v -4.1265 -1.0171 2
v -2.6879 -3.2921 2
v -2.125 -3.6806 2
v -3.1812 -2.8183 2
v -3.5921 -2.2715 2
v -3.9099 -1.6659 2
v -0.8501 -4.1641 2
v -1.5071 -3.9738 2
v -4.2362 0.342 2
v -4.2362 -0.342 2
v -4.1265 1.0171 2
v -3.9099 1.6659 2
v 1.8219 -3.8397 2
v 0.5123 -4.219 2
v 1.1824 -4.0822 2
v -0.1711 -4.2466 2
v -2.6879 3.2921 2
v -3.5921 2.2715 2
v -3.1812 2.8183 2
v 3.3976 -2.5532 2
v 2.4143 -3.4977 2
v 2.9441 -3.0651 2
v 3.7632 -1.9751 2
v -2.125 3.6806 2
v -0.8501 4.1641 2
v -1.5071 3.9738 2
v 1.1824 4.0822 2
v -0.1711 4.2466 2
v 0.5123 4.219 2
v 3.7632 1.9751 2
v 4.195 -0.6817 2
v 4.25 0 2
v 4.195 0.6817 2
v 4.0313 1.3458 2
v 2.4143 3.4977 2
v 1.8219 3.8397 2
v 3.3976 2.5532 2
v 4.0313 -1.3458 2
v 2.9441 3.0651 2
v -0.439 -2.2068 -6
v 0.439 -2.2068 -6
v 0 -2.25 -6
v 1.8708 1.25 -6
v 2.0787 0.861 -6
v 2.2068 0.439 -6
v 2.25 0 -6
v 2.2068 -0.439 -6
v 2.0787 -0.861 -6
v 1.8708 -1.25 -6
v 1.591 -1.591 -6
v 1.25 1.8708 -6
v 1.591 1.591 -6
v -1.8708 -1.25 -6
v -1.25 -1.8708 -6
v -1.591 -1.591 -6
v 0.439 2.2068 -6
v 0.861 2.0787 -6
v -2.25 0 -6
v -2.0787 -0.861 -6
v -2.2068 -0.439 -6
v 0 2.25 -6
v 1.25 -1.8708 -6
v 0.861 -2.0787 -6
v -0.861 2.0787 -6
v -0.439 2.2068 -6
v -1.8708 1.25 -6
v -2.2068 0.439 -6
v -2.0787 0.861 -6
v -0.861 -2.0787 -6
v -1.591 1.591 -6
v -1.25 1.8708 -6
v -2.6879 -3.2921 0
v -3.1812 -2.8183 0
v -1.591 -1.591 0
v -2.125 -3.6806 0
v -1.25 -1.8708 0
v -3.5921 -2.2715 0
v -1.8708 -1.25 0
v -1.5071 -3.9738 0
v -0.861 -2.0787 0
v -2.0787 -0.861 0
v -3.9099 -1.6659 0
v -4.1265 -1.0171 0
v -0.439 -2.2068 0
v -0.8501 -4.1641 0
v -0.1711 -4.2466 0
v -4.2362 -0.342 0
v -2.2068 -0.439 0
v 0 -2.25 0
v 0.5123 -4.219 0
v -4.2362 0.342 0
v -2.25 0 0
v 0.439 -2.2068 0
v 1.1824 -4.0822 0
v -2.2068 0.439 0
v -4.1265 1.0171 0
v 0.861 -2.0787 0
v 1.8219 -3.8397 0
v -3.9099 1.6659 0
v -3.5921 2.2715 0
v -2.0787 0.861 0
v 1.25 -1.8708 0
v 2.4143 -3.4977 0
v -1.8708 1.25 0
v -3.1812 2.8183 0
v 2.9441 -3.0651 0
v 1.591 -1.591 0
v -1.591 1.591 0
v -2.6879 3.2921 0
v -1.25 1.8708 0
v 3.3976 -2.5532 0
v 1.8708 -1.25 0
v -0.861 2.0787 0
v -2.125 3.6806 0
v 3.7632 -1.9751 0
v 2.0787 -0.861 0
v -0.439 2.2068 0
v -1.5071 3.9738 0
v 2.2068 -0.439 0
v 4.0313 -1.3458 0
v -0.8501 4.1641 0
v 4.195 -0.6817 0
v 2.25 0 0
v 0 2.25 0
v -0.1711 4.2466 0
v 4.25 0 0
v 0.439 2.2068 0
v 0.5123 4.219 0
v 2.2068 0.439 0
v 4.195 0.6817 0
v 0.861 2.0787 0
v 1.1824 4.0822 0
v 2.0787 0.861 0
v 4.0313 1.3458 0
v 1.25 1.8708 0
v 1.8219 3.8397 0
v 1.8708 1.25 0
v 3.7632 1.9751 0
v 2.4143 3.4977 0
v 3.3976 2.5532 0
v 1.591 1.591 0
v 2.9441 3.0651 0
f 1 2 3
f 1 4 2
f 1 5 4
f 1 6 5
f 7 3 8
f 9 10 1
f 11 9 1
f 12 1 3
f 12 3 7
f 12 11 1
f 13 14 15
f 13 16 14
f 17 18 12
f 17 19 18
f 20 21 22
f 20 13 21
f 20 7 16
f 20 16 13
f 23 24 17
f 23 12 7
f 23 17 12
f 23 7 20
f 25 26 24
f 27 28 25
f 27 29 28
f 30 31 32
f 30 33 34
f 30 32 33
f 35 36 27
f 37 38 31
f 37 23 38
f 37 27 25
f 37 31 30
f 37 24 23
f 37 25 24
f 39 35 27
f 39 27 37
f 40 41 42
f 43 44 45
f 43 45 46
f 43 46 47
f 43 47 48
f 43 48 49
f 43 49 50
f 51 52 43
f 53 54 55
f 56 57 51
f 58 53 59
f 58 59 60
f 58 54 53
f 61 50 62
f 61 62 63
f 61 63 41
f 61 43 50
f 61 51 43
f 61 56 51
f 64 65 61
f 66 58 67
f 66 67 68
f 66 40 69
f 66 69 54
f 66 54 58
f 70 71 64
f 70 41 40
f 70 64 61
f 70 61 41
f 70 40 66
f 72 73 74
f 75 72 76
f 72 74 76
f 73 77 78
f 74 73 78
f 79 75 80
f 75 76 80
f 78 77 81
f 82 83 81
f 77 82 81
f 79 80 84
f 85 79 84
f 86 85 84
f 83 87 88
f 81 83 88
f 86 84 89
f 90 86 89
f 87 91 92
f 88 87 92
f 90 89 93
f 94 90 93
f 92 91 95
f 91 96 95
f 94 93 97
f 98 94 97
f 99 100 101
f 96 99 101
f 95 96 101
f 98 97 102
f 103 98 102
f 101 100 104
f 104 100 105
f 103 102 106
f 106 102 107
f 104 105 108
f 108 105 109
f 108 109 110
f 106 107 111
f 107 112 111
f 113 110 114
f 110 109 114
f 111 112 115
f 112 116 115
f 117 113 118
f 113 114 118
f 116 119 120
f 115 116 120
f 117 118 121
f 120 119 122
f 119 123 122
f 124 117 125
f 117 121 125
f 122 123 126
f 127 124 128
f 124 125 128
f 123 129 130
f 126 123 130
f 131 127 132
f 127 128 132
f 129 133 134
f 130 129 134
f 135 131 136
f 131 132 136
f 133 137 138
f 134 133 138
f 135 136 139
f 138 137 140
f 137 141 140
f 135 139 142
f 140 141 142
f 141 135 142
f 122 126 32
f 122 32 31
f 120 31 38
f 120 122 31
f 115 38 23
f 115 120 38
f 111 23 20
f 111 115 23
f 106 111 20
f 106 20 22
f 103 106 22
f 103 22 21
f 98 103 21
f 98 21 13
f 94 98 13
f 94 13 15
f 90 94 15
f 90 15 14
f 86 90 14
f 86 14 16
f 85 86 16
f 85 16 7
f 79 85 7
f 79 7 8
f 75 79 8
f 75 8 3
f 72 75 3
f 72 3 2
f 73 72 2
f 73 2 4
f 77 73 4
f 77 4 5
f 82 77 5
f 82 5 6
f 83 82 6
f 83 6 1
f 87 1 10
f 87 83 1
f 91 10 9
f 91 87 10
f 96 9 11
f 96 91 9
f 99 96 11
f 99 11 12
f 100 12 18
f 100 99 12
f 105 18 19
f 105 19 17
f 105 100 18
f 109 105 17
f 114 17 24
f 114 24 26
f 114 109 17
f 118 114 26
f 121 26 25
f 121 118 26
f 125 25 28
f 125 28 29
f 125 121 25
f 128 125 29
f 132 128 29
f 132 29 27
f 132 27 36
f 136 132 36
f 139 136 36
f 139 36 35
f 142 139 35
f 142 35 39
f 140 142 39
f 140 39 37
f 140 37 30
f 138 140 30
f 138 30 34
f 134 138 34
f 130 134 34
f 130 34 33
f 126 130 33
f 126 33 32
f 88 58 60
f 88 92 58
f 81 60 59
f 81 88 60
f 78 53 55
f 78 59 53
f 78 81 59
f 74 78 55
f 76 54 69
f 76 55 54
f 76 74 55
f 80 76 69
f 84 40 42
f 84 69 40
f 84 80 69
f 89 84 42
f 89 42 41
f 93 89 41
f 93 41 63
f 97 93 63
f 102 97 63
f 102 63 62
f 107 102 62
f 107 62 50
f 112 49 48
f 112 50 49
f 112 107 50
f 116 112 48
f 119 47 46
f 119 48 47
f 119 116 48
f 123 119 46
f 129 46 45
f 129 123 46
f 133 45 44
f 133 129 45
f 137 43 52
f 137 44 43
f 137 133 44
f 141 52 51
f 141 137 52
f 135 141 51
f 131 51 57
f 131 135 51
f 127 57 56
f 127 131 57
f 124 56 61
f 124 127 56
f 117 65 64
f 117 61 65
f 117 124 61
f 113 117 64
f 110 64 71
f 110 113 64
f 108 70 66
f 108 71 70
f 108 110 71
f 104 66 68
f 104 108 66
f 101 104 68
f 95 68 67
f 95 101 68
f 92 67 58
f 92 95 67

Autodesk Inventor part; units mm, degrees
ref_plane "YZ Plane" through (0, 0, 0) normal (1, 0, 0) x (0, 1, 0)
ref_plane "XZ Plane" through (0, 0, 0) normal (0, 1, 0) x (-1, 0, 0)
ref_plane "XY Plane" through (0, 0, 0) normal (0, 0, 1) x (1, 0, 0)
sketch "Sketch1" plane through (0, 0, 0) normal (0, 0, 1) x (1, 0, 0)
  circle A0 centre (0, 0) radius 4.25
  dimension "d0" = 8.5
extrude "Extrusion1" add sketch "Sketch1" along normal blind 2
sketch "Sketch2" plane through (0, 0, 0) normal (0, 0, -1) x (-1, 0, 0)
  circle A0 centre (0, 0) radius 2.25
  dimension "d3" = 4.5
extrude "Extrusion2" add sketch "Sketch2" along normal blind 6
sketch "Sketch3" plane through (0, 0, 2) normal (0, 0, 1) x (1, 0, 0)
  circle A0 centre (0, 0) radius 2.25 projected
  circle A1 centre (0, 0) radius 4.25 projected
  line L0 (-4.25, 0) -> (-2.125, 3.6806)
  line L1 (-2.125, 3.6806) -> (2.125, 3.6806)
  line L2 (2.125, 3.6806) -> (4.25, 0)
  line L3 (4.25, 0) -> (2.125, -3.6806)
  line L4 (2.125, -3.6806) -> (-2.125, -3.6806)
  line L5 (-2.125, -3.6806) -> (-4.25, 0)
extrude "Extrusion3" add sketch "Sketch3" against normal blind 2 contours L2 A1 | A1 L3 | L1 A1 | A1 L4 | L0 A1 | A1 L5
thread "Thread2" size "M3x0.5" class "6g" standard "ANSI Metric M Profile" length 6
properties part number "vida"
